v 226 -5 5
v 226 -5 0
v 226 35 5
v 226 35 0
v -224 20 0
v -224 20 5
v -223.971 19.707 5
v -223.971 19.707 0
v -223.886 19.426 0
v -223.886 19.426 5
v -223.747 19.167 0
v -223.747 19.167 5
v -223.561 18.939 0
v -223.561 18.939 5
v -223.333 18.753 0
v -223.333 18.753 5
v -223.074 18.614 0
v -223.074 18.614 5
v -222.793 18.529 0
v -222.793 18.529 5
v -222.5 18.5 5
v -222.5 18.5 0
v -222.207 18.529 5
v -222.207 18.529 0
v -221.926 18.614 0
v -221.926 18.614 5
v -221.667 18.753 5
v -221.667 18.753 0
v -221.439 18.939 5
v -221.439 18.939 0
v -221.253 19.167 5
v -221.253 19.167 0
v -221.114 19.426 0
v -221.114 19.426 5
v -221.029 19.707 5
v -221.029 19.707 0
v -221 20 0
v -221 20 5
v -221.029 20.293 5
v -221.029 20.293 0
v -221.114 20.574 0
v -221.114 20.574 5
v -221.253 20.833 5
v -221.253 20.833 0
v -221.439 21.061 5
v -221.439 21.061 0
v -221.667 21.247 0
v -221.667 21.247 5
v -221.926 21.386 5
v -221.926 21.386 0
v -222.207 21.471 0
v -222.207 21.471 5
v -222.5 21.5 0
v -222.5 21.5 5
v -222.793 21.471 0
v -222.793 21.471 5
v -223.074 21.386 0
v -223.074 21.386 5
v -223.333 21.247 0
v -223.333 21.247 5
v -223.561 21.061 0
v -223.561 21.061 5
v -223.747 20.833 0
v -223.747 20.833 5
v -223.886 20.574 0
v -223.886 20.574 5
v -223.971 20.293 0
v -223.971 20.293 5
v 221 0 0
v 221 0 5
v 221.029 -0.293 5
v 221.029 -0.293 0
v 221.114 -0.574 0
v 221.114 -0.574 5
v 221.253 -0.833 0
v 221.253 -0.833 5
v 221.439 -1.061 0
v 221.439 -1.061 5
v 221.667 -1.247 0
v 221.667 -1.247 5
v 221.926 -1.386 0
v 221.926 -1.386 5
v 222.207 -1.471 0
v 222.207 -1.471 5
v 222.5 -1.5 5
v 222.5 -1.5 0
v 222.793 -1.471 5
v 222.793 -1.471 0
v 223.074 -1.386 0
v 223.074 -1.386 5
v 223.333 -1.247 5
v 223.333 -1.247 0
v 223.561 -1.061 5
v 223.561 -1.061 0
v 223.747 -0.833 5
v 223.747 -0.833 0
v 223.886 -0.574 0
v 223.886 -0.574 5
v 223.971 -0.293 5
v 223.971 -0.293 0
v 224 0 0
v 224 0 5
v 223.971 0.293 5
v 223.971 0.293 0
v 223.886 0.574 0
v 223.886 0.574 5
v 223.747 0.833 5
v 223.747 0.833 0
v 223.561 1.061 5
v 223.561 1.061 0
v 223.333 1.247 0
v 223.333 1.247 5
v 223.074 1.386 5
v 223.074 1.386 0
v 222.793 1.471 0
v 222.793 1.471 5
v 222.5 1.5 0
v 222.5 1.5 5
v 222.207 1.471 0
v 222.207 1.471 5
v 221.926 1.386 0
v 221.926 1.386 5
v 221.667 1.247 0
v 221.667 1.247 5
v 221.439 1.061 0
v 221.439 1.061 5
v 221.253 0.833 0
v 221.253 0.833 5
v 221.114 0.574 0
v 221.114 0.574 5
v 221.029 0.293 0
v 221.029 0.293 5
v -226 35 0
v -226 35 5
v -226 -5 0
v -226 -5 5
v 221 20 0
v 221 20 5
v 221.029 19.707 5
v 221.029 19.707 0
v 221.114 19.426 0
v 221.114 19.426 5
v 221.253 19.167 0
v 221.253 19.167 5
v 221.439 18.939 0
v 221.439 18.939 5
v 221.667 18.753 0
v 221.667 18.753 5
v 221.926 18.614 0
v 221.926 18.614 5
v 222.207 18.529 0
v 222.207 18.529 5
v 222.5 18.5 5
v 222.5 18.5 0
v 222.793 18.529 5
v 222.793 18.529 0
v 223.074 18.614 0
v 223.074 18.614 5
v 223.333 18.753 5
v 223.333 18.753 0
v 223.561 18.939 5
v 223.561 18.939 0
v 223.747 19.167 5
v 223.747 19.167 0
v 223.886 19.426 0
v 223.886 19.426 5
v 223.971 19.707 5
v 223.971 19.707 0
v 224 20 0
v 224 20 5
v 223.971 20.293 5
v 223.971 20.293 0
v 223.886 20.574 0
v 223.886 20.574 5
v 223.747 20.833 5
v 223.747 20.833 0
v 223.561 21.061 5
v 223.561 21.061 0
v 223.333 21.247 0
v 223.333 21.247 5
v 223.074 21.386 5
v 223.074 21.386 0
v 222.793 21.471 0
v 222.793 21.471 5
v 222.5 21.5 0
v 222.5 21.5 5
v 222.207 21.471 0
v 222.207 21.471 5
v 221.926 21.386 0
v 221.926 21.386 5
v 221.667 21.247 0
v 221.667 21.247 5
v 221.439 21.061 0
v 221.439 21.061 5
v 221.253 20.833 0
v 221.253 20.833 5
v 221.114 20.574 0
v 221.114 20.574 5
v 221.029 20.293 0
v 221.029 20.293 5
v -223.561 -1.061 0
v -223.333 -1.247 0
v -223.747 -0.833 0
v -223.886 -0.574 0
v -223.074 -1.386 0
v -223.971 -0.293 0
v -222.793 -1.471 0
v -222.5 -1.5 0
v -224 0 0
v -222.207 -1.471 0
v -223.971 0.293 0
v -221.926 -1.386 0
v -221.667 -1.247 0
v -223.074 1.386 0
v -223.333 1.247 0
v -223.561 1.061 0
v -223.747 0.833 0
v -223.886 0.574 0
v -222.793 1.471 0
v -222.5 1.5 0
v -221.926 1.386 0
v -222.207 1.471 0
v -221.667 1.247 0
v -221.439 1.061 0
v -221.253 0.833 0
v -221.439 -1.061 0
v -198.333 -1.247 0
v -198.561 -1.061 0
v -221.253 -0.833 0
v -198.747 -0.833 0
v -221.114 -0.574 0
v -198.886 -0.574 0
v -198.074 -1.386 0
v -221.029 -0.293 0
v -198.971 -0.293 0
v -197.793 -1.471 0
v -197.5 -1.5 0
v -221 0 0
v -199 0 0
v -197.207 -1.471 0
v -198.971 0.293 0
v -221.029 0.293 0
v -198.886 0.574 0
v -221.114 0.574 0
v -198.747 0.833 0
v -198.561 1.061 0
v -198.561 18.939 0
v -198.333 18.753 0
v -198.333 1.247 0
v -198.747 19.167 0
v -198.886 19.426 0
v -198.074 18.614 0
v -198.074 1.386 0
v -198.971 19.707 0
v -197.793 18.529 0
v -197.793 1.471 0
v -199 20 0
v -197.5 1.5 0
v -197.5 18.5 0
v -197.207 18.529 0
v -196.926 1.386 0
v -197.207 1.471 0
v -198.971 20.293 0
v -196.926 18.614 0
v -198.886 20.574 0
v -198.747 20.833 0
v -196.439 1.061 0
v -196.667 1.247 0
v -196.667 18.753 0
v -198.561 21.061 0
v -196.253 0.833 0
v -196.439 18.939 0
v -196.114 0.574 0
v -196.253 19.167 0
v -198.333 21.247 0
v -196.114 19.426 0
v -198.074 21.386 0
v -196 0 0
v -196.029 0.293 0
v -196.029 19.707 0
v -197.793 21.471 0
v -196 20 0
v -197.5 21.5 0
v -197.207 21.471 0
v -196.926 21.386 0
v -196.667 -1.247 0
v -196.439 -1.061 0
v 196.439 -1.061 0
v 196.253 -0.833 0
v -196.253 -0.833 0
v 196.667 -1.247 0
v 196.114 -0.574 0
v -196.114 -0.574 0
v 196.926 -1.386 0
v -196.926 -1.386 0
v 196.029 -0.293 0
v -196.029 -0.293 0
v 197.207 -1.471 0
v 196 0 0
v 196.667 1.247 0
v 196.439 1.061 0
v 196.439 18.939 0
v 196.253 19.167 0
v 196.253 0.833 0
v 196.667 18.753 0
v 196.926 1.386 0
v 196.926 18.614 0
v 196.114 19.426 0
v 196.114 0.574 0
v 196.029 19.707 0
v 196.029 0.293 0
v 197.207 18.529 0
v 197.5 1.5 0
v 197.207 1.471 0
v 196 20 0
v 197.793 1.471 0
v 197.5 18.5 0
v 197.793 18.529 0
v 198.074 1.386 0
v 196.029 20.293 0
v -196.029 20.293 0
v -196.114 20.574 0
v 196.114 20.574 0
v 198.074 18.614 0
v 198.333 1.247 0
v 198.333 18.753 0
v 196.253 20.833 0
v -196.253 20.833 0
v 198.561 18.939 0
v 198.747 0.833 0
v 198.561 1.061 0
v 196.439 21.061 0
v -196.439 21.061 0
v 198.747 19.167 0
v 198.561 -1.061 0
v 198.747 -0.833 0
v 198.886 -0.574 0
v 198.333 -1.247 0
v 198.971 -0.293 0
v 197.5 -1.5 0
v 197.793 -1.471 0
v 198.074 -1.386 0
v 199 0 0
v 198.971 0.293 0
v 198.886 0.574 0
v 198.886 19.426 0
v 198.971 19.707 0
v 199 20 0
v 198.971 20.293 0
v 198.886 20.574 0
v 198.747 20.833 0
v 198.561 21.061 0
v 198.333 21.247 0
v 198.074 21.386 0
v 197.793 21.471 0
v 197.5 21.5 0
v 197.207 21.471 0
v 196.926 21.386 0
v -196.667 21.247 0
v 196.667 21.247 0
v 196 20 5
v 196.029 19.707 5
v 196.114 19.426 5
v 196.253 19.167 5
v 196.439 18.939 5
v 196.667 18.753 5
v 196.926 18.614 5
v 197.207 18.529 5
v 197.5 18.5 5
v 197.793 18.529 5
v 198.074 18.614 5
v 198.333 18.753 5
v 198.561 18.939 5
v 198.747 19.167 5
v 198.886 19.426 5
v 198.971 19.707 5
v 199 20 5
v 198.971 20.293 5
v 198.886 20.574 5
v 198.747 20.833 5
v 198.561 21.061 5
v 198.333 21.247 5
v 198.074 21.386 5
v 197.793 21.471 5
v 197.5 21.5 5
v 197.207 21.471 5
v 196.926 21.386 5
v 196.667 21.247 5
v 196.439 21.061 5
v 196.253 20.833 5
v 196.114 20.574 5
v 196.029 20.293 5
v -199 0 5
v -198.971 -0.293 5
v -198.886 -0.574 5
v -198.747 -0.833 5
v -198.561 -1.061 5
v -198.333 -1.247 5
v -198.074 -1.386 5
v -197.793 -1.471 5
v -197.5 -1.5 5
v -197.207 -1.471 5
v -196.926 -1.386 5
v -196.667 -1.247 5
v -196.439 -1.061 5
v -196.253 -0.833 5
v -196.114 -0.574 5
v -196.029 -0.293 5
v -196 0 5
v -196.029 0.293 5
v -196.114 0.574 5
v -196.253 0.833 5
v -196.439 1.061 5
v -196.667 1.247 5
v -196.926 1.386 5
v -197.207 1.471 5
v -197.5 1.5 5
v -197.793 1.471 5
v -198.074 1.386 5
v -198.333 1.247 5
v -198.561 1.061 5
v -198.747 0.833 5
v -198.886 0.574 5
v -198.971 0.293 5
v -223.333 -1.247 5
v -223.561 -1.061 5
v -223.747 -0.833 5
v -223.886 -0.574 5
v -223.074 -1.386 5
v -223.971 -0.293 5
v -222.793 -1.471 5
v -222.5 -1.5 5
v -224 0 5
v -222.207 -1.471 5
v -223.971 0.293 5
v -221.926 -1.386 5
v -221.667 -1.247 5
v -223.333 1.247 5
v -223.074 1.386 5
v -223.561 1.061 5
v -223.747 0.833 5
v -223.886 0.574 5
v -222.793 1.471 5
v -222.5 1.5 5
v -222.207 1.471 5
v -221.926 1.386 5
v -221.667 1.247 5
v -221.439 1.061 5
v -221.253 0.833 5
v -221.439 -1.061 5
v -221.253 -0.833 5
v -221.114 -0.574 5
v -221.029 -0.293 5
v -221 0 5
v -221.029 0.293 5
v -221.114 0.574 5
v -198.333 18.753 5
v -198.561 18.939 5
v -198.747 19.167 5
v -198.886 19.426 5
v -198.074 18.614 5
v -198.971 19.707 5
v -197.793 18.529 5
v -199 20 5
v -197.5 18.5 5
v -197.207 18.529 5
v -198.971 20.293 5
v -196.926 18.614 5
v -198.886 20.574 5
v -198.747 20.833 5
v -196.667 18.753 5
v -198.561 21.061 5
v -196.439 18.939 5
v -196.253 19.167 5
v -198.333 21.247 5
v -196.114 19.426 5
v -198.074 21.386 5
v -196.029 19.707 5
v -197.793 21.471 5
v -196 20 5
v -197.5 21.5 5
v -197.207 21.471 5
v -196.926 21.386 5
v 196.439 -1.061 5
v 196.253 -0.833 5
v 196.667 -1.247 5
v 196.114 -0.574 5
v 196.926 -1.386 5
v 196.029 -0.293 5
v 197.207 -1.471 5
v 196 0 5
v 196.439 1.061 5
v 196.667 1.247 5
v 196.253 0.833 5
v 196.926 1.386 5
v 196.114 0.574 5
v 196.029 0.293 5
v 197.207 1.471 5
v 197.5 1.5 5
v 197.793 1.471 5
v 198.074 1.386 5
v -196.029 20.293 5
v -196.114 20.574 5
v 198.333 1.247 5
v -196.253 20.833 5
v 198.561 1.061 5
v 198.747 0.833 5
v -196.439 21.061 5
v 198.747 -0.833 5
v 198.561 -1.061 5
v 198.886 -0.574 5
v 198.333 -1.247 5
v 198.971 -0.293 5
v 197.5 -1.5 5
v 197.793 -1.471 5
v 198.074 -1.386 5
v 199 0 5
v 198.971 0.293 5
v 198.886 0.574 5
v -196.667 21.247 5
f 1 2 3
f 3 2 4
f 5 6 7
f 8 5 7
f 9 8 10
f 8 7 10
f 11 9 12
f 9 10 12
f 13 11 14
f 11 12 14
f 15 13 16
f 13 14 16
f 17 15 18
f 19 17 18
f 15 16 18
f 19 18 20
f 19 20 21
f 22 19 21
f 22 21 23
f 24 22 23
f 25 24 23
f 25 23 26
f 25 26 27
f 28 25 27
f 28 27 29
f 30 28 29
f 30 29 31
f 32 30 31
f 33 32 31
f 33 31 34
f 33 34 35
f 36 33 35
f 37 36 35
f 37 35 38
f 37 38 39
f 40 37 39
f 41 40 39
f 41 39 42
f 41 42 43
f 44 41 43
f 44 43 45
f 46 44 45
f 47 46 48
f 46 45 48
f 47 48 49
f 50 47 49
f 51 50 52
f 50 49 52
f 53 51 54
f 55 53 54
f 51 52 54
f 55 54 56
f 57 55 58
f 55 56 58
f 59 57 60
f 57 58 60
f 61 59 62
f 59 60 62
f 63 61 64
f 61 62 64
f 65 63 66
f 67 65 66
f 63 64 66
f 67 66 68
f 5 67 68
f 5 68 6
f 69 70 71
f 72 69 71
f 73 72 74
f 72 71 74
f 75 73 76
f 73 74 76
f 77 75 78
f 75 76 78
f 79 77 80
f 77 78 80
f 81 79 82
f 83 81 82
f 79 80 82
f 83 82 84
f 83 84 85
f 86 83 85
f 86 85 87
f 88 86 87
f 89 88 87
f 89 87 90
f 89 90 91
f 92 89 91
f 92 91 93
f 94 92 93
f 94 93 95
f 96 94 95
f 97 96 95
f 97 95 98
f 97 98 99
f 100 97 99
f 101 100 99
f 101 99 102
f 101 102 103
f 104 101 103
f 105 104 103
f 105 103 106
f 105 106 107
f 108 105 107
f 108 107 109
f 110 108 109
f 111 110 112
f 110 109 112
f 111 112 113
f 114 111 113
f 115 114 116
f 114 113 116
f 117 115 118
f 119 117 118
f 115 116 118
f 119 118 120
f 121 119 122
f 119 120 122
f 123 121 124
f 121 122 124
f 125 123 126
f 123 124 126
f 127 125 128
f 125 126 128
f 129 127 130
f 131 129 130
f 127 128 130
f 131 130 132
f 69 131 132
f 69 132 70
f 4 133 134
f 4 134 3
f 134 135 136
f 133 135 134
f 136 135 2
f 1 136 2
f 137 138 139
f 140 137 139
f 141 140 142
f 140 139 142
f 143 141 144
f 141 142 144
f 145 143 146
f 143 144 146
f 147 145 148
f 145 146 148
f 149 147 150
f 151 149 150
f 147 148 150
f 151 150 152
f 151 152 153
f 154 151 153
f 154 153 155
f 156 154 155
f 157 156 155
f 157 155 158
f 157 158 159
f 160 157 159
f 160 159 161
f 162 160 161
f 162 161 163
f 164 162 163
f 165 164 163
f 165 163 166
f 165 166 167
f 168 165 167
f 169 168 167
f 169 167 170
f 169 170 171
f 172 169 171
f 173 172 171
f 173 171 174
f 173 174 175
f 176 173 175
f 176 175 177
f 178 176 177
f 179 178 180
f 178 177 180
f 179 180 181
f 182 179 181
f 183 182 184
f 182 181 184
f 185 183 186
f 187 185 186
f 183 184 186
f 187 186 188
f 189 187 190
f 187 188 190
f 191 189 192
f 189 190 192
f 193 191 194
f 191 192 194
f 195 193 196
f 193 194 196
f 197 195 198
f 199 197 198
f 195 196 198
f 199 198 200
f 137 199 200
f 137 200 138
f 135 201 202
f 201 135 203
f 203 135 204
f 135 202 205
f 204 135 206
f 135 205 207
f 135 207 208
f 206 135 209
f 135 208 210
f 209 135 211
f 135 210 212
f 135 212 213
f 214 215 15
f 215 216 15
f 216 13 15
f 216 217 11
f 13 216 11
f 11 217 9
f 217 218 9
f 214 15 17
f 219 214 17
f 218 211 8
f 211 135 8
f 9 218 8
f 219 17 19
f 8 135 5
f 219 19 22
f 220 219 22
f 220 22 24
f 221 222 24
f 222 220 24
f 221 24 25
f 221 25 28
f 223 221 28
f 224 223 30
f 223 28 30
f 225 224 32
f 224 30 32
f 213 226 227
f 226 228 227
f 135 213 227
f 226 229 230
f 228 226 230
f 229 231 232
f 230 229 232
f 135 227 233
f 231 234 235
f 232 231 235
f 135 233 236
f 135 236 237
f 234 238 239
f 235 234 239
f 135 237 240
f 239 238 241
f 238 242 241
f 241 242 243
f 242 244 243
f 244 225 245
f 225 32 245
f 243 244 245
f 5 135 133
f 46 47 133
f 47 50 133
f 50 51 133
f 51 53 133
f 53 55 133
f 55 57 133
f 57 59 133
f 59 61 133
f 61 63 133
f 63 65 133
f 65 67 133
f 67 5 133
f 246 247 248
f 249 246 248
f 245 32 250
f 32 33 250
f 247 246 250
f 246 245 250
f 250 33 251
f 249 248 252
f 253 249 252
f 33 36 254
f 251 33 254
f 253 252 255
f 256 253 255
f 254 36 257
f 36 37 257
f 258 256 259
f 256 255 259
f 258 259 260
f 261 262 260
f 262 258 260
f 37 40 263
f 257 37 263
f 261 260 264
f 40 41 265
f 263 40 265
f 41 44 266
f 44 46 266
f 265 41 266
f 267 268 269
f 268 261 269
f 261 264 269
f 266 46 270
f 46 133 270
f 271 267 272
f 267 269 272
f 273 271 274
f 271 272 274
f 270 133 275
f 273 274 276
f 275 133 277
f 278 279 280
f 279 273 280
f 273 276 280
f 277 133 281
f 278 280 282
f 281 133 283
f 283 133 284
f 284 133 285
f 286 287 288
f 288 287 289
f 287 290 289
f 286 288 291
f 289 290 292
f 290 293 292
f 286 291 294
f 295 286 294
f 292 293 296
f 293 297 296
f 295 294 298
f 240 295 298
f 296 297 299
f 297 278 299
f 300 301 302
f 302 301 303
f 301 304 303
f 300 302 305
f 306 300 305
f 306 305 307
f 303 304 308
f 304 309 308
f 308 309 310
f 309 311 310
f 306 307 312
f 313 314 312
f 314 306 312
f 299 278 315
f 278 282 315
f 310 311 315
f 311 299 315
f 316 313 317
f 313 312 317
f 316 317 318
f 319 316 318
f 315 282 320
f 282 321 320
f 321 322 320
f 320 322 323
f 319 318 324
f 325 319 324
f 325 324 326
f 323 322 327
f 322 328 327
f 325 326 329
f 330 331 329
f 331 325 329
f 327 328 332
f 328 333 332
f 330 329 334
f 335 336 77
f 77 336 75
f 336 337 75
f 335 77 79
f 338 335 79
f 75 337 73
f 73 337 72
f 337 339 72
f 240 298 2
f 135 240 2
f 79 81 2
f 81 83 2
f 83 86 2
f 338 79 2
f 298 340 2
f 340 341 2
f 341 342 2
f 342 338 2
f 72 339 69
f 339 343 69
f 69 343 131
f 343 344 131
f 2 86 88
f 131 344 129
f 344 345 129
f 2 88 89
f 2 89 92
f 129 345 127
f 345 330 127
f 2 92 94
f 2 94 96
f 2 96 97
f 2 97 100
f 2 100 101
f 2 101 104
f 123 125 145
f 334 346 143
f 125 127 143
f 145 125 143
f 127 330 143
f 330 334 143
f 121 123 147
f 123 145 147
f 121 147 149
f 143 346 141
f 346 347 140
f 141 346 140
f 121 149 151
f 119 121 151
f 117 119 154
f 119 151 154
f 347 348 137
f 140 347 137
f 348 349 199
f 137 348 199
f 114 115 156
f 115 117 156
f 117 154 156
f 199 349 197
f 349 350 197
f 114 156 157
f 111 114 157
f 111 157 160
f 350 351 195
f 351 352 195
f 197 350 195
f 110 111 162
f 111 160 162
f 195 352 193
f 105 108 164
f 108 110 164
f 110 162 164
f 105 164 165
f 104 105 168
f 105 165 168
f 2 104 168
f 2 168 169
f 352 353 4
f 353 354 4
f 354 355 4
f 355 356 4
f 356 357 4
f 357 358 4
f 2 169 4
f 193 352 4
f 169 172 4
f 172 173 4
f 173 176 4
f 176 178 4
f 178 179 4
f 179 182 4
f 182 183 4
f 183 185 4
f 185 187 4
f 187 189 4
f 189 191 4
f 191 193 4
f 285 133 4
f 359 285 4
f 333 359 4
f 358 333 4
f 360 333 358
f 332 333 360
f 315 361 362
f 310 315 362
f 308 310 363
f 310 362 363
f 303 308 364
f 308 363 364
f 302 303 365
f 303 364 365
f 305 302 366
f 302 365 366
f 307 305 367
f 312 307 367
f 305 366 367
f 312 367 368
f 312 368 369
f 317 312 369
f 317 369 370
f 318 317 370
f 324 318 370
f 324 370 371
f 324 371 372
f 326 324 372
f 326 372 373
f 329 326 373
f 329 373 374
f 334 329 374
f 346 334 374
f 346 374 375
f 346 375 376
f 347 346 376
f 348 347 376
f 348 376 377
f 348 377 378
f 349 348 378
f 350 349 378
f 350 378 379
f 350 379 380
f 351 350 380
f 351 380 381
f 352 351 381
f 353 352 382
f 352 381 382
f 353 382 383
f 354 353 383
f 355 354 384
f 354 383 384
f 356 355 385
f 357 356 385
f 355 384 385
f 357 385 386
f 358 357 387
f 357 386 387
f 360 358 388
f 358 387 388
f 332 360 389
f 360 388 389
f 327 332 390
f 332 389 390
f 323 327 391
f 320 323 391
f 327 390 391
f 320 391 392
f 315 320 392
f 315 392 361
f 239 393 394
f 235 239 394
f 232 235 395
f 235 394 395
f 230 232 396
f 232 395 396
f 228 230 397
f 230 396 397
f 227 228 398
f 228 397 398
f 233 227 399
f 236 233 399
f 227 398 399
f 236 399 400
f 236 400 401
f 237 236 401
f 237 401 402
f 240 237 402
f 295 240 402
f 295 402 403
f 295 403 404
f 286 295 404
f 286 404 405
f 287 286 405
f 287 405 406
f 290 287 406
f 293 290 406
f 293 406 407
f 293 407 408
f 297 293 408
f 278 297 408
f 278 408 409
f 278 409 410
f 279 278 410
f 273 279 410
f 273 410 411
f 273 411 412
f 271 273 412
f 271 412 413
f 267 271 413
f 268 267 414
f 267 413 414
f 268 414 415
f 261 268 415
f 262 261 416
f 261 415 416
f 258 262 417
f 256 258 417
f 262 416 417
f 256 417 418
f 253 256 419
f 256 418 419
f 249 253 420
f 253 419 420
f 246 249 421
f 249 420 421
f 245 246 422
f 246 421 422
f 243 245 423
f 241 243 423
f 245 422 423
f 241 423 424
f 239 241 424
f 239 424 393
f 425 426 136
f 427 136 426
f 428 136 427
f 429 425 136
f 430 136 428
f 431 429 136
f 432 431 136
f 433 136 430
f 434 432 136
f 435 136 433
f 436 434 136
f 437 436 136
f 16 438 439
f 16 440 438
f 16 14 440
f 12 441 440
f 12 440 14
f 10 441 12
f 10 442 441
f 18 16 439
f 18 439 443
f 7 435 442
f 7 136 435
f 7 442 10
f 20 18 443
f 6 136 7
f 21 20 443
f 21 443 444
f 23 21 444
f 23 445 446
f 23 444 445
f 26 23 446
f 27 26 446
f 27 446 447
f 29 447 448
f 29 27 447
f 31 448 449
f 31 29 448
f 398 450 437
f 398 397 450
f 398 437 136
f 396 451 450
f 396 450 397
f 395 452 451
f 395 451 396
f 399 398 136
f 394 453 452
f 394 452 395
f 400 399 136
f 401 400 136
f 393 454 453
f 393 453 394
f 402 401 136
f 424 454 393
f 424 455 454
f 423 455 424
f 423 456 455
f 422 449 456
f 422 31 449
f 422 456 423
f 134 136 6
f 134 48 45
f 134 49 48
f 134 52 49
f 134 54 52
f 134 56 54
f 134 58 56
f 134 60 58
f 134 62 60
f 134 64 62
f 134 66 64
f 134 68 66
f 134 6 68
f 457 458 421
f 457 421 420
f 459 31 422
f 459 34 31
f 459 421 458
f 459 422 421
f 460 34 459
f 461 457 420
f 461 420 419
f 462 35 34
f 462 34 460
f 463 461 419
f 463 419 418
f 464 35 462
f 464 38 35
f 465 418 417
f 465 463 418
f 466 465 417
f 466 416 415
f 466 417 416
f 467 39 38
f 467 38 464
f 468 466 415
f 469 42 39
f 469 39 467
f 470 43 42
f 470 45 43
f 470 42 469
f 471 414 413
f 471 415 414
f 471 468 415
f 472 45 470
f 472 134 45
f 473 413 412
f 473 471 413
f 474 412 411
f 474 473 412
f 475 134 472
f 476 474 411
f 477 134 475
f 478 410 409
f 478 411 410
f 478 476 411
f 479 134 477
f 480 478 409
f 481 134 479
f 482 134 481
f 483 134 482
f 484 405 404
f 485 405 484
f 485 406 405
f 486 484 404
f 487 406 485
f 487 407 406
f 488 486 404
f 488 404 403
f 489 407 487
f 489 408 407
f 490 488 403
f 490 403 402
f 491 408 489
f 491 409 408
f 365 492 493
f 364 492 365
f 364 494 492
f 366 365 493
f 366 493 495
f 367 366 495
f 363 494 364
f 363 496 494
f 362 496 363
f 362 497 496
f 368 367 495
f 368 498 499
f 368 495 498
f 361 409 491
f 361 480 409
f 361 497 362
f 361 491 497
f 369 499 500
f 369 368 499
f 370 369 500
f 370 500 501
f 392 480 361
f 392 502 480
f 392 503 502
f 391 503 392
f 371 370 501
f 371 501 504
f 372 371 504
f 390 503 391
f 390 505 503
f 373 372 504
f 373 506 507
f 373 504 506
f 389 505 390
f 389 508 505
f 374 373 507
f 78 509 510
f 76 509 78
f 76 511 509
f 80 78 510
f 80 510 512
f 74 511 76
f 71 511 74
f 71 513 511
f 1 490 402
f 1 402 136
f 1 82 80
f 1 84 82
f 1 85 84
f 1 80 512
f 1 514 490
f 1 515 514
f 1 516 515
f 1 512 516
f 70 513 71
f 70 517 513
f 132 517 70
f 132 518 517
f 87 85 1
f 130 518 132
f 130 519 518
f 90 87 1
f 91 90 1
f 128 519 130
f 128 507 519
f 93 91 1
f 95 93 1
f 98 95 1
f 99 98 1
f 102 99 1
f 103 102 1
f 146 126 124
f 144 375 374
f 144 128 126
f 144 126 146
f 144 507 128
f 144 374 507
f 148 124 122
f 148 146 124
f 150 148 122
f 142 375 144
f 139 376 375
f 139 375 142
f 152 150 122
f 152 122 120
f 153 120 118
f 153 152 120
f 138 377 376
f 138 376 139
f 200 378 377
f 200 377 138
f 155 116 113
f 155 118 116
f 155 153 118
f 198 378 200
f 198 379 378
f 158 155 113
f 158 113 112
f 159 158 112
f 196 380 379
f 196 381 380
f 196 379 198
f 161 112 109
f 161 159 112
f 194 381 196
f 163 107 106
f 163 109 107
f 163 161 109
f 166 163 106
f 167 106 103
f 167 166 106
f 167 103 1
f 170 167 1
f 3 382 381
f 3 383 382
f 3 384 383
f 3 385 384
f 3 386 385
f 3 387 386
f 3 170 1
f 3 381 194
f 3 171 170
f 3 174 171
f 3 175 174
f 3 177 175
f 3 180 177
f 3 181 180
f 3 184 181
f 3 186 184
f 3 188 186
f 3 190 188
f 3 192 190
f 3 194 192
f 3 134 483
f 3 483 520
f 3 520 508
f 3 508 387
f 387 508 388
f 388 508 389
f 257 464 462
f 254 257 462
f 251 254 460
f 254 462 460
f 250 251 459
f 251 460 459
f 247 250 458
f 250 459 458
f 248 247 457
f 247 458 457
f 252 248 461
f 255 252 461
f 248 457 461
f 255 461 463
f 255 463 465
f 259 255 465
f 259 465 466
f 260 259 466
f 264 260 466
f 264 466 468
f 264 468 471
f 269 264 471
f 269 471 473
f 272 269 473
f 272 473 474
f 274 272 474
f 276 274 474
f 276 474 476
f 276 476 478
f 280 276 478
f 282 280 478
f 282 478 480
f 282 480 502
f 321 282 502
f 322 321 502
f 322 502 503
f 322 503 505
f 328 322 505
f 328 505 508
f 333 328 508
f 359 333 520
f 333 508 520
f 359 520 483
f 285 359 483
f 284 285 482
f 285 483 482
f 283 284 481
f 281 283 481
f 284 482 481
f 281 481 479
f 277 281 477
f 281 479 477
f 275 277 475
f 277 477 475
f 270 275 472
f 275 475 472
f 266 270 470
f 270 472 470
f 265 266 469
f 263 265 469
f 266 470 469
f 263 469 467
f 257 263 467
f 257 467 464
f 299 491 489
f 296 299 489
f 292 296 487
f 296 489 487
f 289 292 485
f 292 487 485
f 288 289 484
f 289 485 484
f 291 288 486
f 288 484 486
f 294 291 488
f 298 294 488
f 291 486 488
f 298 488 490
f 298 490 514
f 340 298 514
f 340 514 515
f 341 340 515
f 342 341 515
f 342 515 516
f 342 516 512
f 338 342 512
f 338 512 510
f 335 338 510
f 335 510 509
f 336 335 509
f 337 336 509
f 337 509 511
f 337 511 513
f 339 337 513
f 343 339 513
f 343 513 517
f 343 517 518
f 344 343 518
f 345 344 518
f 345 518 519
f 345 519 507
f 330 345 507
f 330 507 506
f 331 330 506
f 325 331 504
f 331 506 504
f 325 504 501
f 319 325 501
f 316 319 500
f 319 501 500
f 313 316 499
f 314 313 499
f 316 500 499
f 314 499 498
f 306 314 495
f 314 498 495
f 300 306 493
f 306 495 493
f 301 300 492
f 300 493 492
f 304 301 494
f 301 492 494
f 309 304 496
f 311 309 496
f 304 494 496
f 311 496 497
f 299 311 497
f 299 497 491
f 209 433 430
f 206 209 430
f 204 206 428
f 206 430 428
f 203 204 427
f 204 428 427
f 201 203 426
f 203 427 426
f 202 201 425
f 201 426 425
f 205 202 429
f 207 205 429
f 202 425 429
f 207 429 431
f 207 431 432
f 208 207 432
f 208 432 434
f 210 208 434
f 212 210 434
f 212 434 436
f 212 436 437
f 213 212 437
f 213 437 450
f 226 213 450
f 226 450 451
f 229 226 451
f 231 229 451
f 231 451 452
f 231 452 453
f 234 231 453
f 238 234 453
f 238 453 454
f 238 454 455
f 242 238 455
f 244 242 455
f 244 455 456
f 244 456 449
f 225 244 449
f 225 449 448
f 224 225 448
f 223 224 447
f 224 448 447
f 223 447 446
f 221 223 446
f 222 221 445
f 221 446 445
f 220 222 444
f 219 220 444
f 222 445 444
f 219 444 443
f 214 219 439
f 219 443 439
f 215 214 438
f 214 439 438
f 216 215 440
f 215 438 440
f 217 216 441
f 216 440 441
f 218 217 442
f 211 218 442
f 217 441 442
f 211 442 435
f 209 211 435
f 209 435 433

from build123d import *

# Parameters (mm, degrees)
F0_W     = 452
F0_H     = 40
F0_W_2   = 25
F0_H_2   = 20
F1_DEPTH = 5
F2_D     = 3


# Not quite as in the source:
# - a feature names something its author has since deleted; it is built from what else it names


with BuildPart() as f1:
    # F0 (on Top) → F1 (new body)
    with BuildSketch(Plane.XY):
        with Locations((0, 15)):
            Rectangle(F0_W, F0_H)
        with Locations((-210, 10)):
            Rectangle(F0_W_2, F0_H_2, mode=Mode.SUBTRACT)
        with Locations((210, 10)):
            Rectangle(F0_W_2, F0_H_2, mode=Mode.SUBTRACT)
        with Locations((210, 10)):
            Rectangle(F0_W_2, F0_H_2)
        with Locations((-210, 10)):
            Rectangle(F0_W_2, F0_H_2)
    extrude(amount=F1_DEPTH)

    # F2 (through all)
    with Locations(Plane(origin=(0, 0, 0), x_dir=(1, 0, 0), z_dir=(0, 0, -1))):
        with Locations((-222.5, 0), (-197.5, 0), (197.5, 0), (222.5, 0), (-222.5, -20), (-197.5, -20), (222.5, -20), (197.5, -20)):
            Hole(F2_D / 2)


solid = f1.part
